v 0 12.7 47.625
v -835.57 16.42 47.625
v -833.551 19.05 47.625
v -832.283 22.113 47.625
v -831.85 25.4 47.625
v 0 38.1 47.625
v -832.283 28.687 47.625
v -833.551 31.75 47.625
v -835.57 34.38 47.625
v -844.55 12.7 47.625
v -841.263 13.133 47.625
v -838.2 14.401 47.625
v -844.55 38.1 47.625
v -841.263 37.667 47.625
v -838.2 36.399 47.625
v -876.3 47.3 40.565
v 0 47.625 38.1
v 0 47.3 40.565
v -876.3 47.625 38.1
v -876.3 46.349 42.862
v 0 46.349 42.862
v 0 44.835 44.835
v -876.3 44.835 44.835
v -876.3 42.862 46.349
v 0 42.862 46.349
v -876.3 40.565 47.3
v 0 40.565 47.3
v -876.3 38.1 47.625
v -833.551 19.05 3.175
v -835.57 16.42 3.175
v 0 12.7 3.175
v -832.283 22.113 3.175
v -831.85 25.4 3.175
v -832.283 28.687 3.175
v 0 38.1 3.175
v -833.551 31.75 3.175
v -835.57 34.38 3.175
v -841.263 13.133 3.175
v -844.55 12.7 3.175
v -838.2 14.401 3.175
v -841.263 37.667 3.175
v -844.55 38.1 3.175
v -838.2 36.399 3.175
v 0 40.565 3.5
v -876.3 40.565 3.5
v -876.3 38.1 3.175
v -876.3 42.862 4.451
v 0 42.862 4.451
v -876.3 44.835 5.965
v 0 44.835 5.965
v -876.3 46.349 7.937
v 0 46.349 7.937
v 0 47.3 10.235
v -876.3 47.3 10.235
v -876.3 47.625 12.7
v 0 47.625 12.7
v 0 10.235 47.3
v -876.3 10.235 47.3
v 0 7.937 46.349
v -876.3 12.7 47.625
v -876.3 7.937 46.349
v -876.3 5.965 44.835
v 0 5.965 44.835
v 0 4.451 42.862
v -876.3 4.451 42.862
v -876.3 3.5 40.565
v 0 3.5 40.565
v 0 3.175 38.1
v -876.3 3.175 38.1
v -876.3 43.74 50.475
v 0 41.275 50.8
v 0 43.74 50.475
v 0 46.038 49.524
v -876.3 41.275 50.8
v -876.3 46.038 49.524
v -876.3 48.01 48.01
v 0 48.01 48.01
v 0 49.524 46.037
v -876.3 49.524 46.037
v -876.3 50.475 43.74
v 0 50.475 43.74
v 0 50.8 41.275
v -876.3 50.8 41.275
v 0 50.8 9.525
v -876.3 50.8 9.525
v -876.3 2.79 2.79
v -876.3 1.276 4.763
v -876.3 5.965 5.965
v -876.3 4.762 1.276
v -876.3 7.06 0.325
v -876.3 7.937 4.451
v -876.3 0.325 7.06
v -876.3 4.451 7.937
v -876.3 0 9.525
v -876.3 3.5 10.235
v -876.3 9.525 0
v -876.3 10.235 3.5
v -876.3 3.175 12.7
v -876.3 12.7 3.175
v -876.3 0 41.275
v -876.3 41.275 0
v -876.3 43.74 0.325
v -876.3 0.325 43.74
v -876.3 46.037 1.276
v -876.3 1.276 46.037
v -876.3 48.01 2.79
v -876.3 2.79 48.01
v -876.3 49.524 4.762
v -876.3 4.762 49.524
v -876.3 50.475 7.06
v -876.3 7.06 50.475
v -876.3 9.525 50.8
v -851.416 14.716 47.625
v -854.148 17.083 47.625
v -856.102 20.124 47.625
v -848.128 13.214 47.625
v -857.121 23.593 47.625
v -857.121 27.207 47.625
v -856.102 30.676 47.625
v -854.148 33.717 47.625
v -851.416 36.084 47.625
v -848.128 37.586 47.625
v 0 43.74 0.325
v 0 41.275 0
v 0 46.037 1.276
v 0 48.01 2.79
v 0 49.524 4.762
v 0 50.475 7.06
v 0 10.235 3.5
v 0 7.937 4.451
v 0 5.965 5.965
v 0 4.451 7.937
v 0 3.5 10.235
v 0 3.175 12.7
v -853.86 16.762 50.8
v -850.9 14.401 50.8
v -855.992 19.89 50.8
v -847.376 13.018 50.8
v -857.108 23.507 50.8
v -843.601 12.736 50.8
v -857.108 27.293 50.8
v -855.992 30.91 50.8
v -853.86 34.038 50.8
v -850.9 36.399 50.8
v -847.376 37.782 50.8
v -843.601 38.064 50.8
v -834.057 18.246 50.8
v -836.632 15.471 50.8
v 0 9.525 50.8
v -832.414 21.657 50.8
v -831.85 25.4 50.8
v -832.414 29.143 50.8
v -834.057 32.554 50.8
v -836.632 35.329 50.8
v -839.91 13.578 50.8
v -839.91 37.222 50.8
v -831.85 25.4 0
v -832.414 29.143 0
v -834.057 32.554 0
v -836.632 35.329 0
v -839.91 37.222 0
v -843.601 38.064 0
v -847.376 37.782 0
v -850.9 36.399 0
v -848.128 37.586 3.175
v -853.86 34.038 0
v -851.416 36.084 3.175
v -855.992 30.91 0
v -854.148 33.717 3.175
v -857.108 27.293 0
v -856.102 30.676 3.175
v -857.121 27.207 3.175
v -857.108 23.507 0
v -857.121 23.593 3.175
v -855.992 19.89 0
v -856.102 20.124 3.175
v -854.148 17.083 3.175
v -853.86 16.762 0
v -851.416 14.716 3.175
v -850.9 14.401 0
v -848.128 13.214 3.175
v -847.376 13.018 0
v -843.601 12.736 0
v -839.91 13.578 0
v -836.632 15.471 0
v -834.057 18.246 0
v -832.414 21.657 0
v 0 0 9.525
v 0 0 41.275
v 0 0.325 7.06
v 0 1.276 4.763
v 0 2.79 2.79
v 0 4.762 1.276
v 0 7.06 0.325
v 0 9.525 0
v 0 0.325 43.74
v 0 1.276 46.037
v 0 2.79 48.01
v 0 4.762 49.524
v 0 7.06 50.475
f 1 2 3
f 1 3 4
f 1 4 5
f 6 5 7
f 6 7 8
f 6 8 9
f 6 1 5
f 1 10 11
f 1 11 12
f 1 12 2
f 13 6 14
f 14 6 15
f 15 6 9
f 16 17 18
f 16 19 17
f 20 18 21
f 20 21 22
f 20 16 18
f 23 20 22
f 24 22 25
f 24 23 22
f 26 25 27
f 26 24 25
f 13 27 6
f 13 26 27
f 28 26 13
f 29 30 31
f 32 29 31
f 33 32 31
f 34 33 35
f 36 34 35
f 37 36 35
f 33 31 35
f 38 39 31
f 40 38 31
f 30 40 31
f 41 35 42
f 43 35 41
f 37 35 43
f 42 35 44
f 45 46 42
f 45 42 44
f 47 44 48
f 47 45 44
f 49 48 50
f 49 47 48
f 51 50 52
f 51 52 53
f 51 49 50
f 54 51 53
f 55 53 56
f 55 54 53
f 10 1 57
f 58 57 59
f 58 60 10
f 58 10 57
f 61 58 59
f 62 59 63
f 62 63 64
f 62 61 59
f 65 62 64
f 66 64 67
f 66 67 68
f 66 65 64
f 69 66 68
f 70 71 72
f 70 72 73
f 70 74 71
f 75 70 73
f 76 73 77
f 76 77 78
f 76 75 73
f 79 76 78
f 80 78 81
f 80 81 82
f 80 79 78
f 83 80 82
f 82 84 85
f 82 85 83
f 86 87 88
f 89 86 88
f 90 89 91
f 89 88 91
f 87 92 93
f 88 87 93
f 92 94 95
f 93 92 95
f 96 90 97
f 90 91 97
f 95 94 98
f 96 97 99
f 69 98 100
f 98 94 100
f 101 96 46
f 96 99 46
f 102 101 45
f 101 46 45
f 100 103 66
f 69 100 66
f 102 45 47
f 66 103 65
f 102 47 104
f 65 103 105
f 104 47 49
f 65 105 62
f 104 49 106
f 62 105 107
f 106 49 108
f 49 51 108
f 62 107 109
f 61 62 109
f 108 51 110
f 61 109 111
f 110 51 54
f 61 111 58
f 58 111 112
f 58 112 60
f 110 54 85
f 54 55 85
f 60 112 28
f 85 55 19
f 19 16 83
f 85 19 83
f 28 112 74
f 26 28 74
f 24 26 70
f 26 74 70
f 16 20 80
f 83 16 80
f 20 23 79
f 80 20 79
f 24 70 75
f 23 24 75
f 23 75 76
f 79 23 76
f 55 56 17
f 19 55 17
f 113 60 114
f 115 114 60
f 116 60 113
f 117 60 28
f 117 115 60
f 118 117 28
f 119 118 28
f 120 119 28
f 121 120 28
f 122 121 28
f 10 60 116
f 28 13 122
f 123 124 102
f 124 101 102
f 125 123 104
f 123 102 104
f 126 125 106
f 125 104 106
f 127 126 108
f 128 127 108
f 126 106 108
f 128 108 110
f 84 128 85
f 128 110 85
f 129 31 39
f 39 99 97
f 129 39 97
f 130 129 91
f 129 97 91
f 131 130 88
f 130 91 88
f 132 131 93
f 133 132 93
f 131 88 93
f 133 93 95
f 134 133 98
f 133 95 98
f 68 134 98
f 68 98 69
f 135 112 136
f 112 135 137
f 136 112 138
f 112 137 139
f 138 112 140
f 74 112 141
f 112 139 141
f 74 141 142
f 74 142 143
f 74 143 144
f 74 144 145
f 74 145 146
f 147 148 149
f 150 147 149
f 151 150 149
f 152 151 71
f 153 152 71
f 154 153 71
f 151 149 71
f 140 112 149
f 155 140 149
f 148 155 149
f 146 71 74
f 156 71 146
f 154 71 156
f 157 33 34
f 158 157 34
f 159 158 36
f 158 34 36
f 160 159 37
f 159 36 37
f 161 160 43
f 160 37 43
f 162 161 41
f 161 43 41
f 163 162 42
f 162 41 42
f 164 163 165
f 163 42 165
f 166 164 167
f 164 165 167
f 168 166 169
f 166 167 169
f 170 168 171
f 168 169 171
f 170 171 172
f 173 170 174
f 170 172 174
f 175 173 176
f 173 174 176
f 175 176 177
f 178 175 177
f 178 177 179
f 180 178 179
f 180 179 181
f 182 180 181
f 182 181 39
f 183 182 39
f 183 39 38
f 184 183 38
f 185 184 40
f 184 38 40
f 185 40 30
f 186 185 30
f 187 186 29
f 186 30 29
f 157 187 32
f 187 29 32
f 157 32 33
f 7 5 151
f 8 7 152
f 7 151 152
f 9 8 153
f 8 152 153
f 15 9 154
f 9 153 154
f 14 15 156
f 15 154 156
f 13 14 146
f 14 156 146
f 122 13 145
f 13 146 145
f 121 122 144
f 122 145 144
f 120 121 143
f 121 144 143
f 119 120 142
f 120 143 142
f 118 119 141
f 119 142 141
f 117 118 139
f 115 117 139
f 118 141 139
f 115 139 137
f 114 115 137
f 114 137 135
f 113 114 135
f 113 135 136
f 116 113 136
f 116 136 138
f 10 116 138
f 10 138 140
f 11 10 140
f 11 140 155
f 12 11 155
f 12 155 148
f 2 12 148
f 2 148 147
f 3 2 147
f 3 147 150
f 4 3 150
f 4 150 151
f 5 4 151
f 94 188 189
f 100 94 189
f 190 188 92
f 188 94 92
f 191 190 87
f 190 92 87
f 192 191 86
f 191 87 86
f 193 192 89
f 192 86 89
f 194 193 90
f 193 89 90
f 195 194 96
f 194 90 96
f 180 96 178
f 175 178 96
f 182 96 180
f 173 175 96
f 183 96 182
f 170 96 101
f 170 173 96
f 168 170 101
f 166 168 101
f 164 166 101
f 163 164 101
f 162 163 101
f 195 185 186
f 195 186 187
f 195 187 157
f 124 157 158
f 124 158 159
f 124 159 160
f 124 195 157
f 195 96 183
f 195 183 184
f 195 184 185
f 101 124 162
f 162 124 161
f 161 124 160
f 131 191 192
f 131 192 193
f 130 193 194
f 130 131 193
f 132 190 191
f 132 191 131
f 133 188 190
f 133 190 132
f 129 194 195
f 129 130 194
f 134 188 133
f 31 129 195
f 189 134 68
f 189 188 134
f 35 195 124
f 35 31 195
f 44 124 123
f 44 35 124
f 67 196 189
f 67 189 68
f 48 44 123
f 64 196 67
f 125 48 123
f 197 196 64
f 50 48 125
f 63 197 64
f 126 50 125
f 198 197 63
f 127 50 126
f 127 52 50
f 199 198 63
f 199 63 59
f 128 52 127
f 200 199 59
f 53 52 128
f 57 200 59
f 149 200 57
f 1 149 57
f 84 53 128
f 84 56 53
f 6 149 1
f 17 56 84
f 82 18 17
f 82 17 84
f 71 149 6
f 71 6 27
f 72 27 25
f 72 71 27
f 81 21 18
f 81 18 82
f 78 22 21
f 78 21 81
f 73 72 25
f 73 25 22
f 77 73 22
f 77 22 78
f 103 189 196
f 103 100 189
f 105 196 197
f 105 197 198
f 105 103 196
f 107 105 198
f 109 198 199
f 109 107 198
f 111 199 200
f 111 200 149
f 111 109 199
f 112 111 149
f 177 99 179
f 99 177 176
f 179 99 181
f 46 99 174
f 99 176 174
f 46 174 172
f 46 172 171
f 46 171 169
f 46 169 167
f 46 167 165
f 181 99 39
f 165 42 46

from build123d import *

# Parameters (mm, degrees)
F0_W     = 50.8
F0_H     = 50.8
F1_DEPTH = 876.3
F2_W     = 44.45
F2_H     = 44.45
F3_DEPTH = 876.3
F4_R     = 9.525
F5_R     = 12.7
F6_DEPTH = 50.8


with BuildPart() as f1:
    # F0 (on Right) → F1 (new body)
    with BuildSketch(Plane.YZ):
        with Locations((25.4, 25.4)):
            Rectangle(F0_W, F0_H)
    extrude(amount=-F1_DEPTH)

    # F2 (on face) → F3 (cut)
    with BuildSketch(Plane.YZ):
        with Locations((25.4, 25.4)):
            Rectangle(F2_W, F2_H)
    extrude(amount=-F3_DEPTH, mode=Mode.SUBTRACT)

    # F4
    f4_edges = [f1.edges().sort_by_distance(p)[0] for p in [
        (-438.15, 3.175, 3.175),
        (-438.15, 47.625, 3.175),
        (-438.15, 47.625, 47.625),
        (-438.15, 3.175, 47.625),
        (-438.15, 50.8, 0),
        (-438.15, 50.8, 50.8),
        (-438.15, 0, 50.8),
        (-438.15, 0, 0),
    ]]
    fillet(f4_edges, radius=F4_R)

    # F5 (on face) → F6 (cut)
    with BuildSketch(Plane.XY.offset(50.8)):
        with Locations((-844.55, 25.4)):
            Circle(F5_R)
    extrude(amount=-F6_DEPTH, mode=Mode.SUBTRACT)


solid = f1.part
